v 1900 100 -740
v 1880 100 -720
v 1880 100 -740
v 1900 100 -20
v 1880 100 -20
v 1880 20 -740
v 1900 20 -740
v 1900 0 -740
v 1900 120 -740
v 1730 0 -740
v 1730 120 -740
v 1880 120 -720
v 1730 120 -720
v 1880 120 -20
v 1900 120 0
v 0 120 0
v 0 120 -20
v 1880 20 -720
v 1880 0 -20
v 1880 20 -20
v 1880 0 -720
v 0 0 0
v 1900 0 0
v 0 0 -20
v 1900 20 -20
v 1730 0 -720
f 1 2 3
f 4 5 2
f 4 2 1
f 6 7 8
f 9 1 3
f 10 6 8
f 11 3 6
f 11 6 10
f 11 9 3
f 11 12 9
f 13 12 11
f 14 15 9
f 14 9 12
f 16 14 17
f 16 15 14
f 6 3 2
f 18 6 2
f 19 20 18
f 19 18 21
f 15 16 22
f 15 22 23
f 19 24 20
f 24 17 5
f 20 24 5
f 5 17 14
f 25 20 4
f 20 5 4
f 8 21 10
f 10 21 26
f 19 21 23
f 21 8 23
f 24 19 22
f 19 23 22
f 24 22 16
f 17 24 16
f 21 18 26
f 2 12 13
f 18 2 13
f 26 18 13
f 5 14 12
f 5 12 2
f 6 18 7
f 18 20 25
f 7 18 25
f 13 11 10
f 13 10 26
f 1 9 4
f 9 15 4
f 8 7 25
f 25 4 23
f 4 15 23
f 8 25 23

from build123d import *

# Parameters (mm, degrees)
F0_W     = 1900
F0_H     = 120
F1_DEPTH = 20
F2_W     = 20
F2_H     = 20
F3_DEPTH = 720
F4_W     = 150
F4_H     = 20
F5_DEPTH = 120


with BuildPart() as f1:
    # F0 (on Top) → F1 (new body)
    with BuildSketch(Plane.XY):
        with Locations((950, 60)):
            Rectangle(F0_W, F0_H)
    extrude(amount=-F1_DEPTH)

    # F2 (on face) → F3 (join)
    with BuildSketch(Plane(origin=(0, 0, -20), x_dir=(1, 0, 0), z_dir=(0, 0, -1))):
        with Locations((1890, -110)):
            Rectangle(F2_W, F2_H)
        with Locations((1890, -10)):
            Rectangle(F2_W, F2_H)
    extrude(amount=F3_DEPTH)

    # F4 (on face) → F5 (join)
    with BuildSketch(Plane(origin=(0, 120, 0), x_dir=(-1, 0, 0), z_dir=(0, 1, 0))):
        with Locations((-1805, -730)):
            Rectangle(F4_W, F4_H)
    extrude(amount=-F5_DEPTH)


solid = f1.part
